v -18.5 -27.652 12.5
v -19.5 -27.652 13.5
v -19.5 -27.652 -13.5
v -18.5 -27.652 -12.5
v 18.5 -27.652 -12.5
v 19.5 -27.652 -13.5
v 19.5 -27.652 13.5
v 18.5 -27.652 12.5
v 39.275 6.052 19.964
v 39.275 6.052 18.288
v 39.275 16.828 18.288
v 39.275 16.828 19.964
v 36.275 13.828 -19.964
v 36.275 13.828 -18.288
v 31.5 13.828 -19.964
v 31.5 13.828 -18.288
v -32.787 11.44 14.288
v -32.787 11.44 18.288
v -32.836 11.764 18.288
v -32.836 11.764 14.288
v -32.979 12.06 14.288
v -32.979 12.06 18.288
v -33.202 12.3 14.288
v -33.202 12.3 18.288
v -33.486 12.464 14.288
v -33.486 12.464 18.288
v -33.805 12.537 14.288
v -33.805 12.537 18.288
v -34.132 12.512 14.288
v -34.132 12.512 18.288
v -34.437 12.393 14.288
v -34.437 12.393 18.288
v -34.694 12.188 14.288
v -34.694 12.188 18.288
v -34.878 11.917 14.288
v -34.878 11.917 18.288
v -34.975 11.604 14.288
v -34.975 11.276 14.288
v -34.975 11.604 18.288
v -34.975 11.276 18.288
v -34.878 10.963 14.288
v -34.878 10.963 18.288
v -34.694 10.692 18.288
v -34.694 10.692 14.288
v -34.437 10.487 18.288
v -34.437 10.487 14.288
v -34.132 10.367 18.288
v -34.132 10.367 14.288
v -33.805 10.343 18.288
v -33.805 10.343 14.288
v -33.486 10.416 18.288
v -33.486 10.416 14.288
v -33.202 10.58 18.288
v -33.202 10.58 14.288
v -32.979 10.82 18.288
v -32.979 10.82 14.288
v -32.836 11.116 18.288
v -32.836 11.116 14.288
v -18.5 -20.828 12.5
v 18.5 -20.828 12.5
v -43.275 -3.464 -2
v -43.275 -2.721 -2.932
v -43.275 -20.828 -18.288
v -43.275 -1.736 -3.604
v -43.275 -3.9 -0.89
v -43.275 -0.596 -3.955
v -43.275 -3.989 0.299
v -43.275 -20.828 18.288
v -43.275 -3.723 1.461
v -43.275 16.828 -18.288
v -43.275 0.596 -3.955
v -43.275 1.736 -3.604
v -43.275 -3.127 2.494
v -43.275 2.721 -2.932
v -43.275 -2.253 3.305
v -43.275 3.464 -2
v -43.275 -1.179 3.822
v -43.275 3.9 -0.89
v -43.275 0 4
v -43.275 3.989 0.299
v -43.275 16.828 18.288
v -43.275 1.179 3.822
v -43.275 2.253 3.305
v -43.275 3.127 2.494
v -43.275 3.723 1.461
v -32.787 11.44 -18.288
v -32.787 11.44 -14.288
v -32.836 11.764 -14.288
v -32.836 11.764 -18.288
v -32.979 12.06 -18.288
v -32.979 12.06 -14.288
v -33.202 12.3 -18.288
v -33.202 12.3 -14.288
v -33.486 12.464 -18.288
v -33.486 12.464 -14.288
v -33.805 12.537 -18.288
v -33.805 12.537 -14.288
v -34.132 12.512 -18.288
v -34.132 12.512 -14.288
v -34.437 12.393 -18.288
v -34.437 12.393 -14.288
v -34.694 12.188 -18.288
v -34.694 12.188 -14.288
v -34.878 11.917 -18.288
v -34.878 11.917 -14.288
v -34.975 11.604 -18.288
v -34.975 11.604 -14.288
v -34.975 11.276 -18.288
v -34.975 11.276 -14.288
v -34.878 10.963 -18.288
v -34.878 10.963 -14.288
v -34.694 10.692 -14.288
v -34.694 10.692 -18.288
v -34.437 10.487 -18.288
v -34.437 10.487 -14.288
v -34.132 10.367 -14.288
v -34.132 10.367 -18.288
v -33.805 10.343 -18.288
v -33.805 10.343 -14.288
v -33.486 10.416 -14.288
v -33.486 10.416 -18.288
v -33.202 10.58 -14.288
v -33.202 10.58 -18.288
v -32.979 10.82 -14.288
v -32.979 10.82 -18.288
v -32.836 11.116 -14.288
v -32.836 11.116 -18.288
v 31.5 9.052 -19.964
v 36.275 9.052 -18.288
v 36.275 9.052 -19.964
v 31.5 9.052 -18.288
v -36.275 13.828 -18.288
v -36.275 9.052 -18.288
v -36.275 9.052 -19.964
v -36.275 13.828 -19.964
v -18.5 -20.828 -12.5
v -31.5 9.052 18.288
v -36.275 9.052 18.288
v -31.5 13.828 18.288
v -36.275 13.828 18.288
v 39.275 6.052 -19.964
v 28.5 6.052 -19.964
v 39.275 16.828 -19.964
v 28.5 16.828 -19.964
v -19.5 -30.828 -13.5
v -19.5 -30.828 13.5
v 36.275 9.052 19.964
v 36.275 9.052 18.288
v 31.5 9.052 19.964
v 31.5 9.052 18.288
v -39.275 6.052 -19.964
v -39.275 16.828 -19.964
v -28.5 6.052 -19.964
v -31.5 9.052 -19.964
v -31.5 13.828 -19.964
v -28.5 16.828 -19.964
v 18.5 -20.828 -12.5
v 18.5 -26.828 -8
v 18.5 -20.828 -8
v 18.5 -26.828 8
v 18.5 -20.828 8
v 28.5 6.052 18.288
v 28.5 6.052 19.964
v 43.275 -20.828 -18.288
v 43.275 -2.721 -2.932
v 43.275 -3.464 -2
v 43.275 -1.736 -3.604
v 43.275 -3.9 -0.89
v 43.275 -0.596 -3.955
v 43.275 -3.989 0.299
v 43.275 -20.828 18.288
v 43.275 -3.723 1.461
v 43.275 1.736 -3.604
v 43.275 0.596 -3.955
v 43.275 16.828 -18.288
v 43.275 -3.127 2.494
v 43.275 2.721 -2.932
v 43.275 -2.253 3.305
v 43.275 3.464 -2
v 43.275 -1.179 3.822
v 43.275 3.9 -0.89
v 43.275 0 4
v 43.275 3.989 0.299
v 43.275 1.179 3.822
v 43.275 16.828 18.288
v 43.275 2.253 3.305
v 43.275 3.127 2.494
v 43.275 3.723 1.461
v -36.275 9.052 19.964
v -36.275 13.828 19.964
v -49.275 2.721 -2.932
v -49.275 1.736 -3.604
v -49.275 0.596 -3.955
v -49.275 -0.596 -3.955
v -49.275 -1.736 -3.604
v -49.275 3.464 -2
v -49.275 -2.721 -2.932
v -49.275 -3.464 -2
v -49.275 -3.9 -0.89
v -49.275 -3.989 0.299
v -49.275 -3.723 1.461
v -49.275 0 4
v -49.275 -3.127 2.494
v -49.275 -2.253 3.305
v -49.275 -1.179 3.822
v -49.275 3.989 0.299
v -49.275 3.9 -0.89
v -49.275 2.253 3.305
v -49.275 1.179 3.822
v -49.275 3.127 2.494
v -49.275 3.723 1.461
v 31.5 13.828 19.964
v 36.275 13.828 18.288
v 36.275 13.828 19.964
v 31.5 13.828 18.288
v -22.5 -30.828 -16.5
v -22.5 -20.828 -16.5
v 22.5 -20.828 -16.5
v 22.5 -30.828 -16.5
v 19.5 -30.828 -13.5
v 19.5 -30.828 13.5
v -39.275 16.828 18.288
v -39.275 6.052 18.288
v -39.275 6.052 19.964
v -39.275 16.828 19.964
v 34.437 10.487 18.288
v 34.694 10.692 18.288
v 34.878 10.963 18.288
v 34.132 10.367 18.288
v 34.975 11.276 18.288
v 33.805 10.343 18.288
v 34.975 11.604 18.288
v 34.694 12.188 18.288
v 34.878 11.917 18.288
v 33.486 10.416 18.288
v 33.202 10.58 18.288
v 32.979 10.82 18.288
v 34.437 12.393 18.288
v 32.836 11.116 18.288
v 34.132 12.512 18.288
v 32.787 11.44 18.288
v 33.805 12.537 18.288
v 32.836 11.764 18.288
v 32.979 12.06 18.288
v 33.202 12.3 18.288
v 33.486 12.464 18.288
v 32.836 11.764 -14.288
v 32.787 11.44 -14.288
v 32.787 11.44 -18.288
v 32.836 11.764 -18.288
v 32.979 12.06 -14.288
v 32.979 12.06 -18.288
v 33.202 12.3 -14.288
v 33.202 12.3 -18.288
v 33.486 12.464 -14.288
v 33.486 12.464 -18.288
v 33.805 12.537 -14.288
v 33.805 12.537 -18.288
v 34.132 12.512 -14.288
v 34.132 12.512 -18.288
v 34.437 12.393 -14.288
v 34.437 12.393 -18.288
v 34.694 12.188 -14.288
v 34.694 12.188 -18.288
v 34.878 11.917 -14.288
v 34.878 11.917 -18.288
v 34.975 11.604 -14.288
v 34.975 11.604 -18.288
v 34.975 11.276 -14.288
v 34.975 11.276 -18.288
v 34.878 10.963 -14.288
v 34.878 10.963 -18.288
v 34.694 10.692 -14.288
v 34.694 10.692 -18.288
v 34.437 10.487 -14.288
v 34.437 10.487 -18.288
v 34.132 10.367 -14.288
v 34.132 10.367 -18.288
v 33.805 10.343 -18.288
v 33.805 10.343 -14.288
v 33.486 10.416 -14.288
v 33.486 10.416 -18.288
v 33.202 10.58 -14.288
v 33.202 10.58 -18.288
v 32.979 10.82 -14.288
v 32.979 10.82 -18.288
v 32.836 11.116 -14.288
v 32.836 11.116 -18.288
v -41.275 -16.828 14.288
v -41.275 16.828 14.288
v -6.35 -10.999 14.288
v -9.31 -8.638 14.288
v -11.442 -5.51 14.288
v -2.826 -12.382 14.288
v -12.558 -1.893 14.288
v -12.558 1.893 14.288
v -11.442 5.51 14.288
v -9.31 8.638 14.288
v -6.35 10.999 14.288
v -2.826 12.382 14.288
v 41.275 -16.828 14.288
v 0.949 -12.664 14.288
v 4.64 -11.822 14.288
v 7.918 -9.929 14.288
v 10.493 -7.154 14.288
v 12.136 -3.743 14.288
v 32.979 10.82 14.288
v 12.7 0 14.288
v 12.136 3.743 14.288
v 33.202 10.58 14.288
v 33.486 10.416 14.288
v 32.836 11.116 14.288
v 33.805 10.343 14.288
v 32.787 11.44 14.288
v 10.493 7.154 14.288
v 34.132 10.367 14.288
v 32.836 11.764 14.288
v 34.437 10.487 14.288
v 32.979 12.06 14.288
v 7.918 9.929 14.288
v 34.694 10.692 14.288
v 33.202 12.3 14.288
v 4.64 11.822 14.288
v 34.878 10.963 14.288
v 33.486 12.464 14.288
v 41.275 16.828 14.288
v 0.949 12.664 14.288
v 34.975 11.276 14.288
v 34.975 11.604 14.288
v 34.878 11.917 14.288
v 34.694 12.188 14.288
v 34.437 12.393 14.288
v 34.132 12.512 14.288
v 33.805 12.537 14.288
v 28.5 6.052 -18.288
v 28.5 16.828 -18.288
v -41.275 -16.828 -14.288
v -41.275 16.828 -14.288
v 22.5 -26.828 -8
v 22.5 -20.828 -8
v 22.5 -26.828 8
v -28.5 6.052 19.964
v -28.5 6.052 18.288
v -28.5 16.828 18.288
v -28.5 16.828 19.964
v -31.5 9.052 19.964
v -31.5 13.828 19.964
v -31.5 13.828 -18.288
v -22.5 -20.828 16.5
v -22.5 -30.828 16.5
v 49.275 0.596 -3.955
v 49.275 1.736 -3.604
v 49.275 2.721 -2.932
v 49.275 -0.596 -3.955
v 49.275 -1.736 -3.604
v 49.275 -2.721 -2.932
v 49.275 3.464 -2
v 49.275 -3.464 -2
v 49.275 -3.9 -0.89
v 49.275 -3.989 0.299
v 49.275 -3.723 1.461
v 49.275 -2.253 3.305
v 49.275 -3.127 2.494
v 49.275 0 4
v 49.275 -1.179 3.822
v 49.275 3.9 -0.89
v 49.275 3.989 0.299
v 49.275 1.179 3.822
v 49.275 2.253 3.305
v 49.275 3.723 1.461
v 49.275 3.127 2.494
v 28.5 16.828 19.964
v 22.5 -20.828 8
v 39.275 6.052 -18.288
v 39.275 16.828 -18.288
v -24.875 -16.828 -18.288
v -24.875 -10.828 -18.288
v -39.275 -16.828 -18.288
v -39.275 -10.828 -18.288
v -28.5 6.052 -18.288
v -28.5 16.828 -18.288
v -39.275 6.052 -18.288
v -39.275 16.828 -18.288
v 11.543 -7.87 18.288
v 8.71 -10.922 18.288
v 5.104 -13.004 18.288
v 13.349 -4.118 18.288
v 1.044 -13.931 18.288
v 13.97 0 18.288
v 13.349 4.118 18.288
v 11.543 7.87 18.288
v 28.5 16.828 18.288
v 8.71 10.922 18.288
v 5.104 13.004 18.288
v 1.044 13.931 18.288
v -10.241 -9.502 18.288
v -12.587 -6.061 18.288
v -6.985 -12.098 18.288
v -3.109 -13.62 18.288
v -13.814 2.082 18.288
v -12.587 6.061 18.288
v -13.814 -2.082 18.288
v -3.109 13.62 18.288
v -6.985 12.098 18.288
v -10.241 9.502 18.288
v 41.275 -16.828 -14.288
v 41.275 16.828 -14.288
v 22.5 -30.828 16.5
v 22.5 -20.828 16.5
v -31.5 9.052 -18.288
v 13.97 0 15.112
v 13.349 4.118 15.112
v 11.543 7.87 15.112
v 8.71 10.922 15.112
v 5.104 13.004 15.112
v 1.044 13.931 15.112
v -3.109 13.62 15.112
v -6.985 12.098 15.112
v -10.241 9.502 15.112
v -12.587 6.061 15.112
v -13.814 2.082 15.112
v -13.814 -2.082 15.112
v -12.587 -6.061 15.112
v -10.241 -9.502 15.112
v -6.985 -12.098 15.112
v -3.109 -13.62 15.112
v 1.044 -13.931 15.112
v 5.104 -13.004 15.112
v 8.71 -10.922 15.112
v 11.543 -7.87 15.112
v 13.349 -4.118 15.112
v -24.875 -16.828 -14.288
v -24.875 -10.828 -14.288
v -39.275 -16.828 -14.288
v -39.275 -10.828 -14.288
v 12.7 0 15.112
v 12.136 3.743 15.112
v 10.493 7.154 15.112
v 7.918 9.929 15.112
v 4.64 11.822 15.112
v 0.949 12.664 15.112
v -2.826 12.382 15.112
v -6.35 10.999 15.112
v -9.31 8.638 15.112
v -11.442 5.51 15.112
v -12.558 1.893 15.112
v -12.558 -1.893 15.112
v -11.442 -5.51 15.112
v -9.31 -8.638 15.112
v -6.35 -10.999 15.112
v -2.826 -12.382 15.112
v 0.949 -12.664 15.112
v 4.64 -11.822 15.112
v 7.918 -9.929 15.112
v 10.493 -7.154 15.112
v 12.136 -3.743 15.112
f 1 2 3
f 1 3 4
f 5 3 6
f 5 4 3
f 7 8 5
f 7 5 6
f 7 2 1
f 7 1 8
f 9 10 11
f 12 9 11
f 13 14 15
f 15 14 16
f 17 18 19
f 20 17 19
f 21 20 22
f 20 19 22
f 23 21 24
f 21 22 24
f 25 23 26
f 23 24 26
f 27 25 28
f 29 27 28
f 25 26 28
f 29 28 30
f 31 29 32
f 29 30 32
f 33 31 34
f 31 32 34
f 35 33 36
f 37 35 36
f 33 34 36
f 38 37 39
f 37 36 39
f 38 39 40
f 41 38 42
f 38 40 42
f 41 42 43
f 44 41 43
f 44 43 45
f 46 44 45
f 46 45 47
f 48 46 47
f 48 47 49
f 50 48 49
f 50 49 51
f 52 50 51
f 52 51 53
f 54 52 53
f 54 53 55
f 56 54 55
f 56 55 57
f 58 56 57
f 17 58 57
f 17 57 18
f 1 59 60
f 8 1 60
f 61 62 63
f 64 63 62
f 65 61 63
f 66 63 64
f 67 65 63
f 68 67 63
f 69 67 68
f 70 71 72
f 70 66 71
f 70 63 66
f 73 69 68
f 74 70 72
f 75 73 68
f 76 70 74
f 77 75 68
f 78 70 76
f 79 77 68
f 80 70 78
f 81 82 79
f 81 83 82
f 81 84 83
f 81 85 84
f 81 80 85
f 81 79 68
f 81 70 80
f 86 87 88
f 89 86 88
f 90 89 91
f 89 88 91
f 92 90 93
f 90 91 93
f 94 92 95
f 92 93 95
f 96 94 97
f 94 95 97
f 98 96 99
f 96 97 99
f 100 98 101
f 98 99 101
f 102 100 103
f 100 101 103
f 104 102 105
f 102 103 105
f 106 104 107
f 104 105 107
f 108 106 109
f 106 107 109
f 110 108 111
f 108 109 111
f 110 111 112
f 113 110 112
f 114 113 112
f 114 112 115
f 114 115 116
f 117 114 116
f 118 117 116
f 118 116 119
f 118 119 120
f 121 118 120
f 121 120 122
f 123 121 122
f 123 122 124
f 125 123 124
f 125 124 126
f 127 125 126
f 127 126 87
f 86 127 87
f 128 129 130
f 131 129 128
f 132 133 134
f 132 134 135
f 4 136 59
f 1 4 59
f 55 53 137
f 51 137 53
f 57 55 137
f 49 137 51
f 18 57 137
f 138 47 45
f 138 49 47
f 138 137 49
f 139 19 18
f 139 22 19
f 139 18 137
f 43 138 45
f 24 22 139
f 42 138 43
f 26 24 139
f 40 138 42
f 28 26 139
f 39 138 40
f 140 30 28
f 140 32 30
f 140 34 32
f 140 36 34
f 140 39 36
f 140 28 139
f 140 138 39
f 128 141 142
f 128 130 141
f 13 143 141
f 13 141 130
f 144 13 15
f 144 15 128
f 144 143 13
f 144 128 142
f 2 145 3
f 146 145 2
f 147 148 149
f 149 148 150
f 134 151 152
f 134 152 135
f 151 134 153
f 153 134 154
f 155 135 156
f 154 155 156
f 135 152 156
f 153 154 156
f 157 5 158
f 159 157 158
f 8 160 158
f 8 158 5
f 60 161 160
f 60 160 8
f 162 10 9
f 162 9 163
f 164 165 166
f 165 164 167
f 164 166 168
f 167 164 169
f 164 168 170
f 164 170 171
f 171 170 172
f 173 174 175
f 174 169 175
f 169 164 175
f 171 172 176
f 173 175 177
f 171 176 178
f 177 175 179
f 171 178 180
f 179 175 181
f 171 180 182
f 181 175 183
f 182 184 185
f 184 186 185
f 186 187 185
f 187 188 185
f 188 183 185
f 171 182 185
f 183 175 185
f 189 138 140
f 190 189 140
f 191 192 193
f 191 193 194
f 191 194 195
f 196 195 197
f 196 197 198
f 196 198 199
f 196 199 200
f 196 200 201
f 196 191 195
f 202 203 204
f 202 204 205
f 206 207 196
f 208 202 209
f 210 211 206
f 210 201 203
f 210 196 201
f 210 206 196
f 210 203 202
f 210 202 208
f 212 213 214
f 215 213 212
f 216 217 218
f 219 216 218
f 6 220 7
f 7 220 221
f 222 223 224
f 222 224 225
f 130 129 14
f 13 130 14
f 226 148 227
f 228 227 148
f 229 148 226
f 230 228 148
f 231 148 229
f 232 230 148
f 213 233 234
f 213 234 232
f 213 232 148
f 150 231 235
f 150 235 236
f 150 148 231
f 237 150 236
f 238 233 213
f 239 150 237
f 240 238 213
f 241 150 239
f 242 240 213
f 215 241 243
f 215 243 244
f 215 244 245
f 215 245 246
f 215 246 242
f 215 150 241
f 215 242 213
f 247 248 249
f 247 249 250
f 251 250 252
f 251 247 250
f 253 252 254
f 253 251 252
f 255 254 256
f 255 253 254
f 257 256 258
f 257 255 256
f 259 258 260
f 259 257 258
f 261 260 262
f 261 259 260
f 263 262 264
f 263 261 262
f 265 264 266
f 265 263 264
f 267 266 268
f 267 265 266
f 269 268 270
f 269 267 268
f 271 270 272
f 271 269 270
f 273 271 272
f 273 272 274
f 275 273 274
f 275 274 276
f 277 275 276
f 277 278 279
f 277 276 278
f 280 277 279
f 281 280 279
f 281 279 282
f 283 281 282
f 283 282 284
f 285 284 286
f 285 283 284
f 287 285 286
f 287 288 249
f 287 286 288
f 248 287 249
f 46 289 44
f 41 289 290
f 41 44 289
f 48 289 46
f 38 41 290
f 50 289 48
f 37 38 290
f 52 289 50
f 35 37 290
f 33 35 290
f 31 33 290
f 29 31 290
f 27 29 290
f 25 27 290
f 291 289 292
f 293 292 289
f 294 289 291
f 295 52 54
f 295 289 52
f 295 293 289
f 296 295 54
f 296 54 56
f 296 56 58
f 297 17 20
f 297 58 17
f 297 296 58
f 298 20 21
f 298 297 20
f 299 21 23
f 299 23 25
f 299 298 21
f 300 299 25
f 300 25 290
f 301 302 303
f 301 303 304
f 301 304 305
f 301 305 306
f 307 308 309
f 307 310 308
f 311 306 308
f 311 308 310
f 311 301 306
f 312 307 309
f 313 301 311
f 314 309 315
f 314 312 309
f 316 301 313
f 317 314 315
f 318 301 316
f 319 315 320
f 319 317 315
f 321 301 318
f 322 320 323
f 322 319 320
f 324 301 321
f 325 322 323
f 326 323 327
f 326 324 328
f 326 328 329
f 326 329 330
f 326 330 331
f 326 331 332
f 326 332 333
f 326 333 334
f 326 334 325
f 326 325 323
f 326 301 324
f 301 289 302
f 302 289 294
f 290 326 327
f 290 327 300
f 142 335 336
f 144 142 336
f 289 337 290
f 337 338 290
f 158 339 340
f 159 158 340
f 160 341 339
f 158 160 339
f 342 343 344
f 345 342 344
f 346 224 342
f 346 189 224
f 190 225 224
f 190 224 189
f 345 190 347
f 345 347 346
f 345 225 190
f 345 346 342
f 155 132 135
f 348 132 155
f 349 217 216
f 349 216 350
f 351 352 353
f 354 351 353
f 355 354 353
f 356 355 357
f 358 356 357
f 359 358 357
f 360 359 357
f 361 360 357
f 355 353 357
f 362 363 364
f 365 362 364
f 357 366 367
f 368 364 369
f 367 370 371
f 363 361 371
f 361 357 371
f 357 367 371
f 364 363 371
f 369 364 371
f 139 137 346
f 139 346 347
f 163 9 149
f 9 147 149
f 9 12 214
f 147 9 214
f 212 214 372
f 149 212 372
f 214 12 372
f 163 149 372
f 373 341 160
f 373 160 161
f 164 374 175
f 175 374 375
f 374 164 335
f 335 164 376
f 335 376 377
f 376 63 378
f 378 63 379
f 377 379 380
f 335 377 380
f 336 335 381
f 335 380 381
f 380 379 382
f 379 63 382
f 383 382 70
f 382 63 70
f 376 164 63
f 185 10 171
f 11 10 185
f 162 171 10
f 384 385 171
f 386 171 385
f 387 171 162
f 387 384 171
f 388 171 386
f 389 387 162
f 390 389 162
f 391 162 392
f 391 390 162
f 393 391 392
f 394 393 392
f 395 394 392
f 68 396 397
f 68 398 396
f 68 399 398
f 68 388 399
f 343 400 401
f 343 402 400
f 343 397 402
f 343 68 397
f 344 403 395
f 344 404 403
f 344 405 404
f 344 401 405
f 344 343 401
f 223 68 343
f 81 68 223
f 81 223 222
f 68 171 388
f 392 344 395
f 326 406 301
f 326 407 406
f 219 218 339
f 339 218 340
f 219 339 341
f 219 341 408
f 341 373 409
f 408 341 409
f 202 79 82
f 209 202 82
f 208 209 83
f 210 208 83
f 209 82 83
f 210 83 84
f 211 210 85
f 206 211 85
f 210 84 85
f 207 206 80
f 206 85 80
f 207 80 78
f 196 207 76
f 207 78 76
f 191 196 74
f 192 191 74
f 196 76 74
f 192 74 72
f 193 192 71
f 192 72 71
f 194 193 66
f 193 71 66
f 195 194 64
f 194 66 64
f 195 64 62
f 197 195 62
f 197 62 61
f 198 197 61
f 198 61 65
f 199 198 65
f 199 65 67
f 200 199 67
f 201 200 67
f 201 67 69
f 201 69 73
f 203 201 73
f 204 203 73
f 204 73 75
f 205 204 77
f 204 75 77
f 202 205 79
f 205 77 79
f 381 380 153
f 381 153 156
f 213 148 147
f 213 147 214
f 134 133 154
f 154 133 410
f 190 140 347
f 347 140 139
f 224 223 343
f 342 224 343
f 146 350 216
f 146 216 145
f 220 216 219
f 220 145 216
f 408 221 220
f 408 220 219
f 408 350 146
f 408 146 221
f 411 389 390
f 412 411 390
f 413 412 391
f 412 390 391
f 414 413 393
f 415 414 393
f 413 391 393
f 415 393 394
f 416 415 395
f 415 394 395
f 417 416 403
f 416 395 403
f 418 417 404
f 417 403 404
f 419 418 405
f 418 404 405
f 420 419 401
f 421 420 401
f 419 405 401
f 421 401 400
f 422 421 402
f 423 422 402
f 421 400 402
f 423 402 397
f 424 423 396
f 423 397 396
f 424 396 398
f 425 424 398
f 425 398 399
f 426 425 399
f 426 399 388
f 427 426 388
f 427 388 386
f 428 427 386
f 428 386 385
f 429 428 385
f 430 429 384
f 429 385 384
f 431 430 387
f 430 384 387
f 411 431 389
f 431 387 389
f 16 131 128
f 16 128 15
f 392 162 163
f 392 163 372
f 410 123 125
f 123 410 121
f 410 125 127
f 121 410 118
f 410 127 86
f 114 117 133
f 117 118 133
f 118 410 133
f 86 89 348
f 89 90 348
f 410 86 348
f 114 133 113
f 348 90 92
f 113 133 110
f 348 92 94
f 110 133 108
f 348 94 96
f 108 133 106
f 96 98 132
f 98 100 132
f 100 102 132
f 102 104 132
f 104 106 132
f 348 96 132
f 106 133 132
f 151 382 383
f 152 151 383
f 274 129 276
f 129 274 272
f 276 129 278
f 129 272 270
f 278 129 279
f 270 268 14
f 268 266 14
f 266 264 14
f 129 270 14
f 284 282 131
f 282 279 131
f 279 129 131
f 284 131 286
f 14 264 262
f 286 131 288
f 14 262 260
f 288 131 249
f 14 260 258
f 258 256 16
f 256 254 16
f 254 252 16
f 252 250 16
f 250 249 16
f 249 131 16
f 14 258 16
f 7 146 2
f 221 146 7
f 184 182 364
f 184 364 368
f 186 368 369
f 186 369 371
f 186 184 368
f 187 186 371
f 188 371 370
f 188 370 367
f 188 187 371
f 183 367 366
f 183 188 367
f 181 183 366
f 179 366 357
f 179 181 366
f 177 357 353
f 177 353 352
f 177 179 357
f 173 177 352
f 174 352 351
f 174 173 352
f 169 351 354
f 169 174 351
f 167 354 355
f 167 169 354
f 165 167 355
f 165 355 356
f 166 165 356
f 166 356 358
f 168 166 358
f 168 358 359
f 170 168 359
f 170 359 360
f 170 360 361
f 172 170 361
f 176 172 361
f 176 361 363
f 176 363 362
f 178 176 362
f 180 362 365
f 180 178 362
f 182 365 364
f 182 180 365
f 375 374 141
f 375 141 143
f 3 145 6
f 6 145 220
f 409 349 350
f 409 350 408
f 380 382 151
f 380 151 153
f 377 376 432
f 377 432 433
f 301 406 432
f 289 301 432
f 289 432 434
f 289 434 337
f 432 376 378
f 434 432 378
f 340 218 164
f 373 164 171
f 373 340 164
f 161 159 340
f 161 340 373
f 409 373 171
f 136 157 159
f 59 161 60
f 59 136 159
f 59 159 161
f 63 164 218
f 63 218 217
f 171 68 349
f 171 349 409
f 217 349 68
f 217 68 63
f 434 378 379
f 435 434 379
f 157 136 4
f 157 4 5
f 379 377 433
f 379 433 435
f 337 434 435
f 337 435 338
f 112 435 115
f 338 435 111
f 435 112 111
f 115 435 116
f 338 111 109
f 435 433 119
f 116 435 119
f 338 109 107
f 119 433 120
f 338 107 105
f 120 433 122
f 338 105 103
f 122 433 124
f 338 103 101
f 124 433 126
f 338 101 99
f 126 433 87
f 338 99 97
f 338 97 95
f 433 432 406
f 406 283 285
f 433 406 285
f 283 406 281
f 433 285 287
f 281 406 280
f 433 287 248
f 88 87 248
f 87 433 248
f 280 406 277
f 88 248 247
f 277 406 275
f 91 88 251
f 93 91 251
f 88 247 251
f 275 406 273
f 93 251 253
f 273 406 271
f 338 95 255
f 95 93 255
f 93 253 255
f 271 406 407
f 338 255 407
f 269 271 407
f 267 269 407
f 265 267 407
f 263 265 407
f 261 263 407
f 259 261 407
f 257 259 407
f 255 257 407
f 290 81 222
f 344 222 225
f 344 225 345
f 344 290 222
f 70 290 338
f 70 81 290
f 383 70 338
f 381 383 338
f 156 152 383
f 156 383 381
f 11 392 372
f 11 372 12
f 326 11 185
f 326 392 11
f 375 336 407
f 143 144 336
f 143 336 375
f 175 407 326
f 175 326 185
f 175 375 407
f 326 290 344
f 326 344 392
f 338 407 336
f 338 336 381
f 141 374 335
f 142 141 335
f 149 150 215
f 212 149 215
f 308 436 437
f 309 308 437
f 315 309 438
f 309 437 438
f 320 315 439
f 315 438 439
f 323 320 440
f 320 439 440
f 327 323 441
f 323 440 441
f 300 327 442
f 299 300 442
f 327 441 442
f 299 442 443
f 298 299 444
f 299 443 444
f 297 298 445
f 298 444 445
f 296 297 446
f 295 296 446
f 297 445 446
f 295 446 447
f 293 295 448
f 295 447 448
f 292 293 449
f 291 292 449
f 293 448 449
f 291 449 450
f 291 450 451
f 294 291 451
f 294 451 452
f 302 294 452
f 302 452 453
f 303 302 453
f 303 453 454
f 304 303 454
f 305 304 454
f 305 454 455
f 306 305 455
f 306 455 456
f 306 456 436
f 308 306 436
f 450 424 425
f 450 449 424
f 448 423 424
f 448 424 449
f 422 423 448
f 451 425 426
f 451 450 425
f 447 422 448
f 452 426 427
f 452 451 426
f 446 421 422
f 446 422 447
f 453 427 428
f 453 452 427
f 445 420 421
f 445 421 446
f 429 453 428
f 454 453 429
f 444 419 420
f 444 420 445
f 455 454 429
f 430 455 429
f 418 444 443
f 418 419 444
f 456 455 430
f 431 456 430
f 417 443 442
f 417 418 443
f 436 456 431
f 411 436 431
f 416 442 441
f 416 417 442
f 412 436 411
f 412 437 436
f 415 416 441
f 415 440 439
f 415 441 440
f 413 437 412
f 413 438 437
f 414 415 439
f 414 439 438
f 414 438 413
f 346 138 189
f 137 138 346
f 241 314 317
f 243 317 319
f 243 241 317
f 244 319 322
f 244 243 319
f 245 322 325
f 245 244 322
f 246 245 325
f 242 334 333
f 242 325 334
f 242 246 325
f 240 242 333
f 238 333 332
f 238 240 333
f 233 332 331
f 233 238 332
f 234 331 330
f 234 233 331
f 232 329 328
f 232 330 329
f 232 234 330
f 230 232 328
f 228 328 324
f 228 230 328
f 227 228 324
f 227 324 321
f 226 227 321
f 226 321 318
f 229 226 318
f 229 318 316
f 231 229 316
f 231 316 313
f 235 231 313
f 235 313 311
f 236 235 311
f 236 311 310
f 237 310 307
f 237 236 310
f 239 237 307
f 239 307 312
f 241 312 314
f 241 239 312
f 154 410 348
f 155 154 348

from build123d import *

# Parameters (mm, degrees)
SKETCH1_W                 = 36.575
SKETCH1_H                 = 41.655
SKETCH1_W_2               = 28.575
SKETCH1_H_2               = 33.655
BOSS_EXTRUDE1_DEPTH       = 41.275
SKETCH2_W                 = 36.575
SKETCH2_H                 = 41.655
BOSS_EXTRUDE2_DEPTH       = 2
SKETCH3_W                 = 86.55
SKETCH3_H                 = 36.575
CUT_EXTRUDE1_DEPTH        = 4
SKETCH4_W                 = 10.7752
SKETCH4_H                 = 10.7752
SKETCH4_W_2               = 4.7752
SKETCH4_H_2               = 4.7752
BOSS_EXTRUDE3_DEPTH       = 1.6764
MIRROR3_COPY_1_SKETCH_W   = 10.7752
MIRROR3_COPY_1_SKETCH_H   = 10.7752
MIRROR3_COPY_1_SKETCH_W_2 = 4.7752
MIRROR3_COPY_1_SKETCH_H_2 = 4.7752
MIRROR3_COPY_1_DEPTH      = 1.6764
SKETCH5_R                 = 1.1
CUT_EXTRUDE2_DEPTH        = 62.397719691
SKETCH6_R                 = 4
BOSS_EXTRUDE4_DEPTH       = 6
SKETCH7_R                 = 12.7
CUT_EXTRUDE3_DEPTH        = 4
SKETCH8_R                 = 13.97
CUT_EXTRUDE4_DEPTH        = 3.175
SKETCH9_W                 = 14.4
SKETCH9_H                 = 6
CUT_EXTRUDE5_DEPTH        = 4
SKETCH10_W                = 45
SKETCH10_H                = 33
SKETCH10_W_2              = 37
SKETCH10_H_2              = 25
BOSS_EXTRUDE5_DEPTH       = 10
SKETCH11_W                = 39
SKETCH11_H                = 27
CUT_EXTRUDE7_DEPTH        = 3.175
SKETCH14_W                = 16
SKETCH14_H                = 6
CUT_EXTRUDE8_DEPTH        = 4


with BuildPart() as part:
    # Sketch1 → Boss-Extrude1 (new, symmetric)
    with BuildSketch(Plane(origin=(0, 0, 0), x_dir=(0, 0, -1), z_dir=(1, 0, 0))):
        Rectangle(SKETCH1_W, SKETCH1_H)
        Rectangle(SKETCH1_W_2, SKETCH1_H_2, mode=Mode.SUBTRACT)
    extrude(amount=BOSS_EXTRUDE1_DEPTH, both=True)

    # Sketch2 → Boss-Extrude2 (add)
    with BuildSketch(Plane.ZY.offset(41.275)):
        Rectangle(SKETCH2_W, SKETCH2_H)
    boss_extrude2 = extrude(amount=BOSS_EXTRUDE2_DEPTH)

    # Mirror1: Boss-Extrude2 across plane
    add(boss_extrude2.mirror(Plane(origin=(0, 0, 0), x_dir=(0, 0, 1), z_dir=(1, 0, 0))))

    # Sketch3 → Cut-Extrude1 (cut)
    with BuildSketch(Plane(origin=(0, 20.8275, 0), x_dir=(1, 0, 0), z_dir=(0, 1, 0))):
        Rectangle(SKETCH3_W, SKETCH3_H)
    extrude(amount=-CUT_EXTRUDE1_DEPTH, mode=Mode.SUBTRACT)

    # Sketch4 → Boss-Extrude3 (add)
    with BuildSketch(Plane(origin=(0, 0, -18.2875), x_dir=(-1, 0, 0), z_dir=(0, 0, -1))):
        with Locations((-33.8874, 11.4399)):
            Rectangle(SKETCH4_W, SKETCH4_H)
        with Locations((-33.8874, 11.4399)):
            Rectangle(SKETCH4_W_2, SKETCH4_H_2, mode=Mode.SUBTRACT)
    boss_extrude3 = extrude(amount=BOSS_EXTRUDE3_DEPTH)

    # Mirror2: Boss-Extrude3 across plane
    add(boss_extrude3.mirror(Plane(origin=(0, 0, 0), x_dir=(0, 0, 1), z_dir=(1, 0, 0))))

    # Mirror3: Boss-Extrude3 across plane
    add(boss_extrude3.mirror(Plane.XY))

    # Mirror3 copy 1 sketch → Mirror3 copy 1 (add)
    with BuildSketch(Plane.XY.offset(18.2875)):
        with Locations((-33.8874, 11.4399)):
            Rectangle(MIRROR3_COPY_1_SKETCH_W, MIRROR3_COPY_1_SKETCH_H)
        with Locations((-33.8874, 11.4399)):
            Rectangle(MIRROR3_COPY_1_SKETCH_W_2, MIRROR3_COPY_1_SKETCH_H_2, mode=Mode.SUBTRACT)
    extrude(amount=MIRROR3_COPY_1_DEPTH)

    # Sketch5 → Cut-Extrude2 (cut, through all)
    with BuildSketch(Plane.XY.offset(18.2875)):
        with Locations((-33.8874, 11.4399)):
            Circle(SKETCH5_R)
    cut_extrude2 = extrude(amount=-CUT_EXTRUDE2_DEPTH, mode=Mode.SUBTRACT)

    # Mirror4: Cut-Extrude2 across plane
    add(cut_extrude2.mirror(Plane(origin=(0, 0, 0), x_dir=(0, 0, 1), z_dir=(1, 0, 0))), mode=Mode.SUBTRACT)

    # Sketch6 → Boss-Extrude4 (add)
    with BuildSketch(Plane.ZY.offset(43.275)):
        Circle(SKETCH6_R)
    boss_extrude4 = extrude(amount=BOSS_EXTRUDE4_DEPTH)

    # Mirror5: Boss-Extrude4 across plane
    add(boss_extrude4.mirror(Plane(origin=(0, 0, 0), x_dir=(0, 0, 1), z_dir=(1, 0, 0))))

    # Sketch7 → Cut-Extrude3 (cut)
    with BuildSketch(Plane.XY.offset(18.2875)):
        Circle(SKETCH7_R)
    extrude(amount=-CUT_EXTRUDE3_DEPTH, mode=Mode.SUBTRACT)

    # Sketch8 → Cut-Extrude4 (cut)
    with BuildSketch(Plane.XY.offset(18.2875)):
        Circle(SKETCH8_R)
    extrude(amount=-CUT_EXTRUDE4_DEPTH, mode=Mode.SUBTRACT)

    # Sketch9 → Cut-Extrude5 (cut)
    with BuildSketch(Plane(origin=(0, 0, -18.2875), x_dir=(-1, 0, 0), z_dir=(0, 0, -1))):
        with Locations((32.075, -13.8275)):
            Rectangle(SKETCH9_W, SKETCH9_H)
    extrude(amount=-CUT_EXTRUDE5_DEPTH, mode=Mode.SUBTRACT)

    # Sketch10 → Boss-Extrude5 (add)
    with BuildSketch(Plane.XZ.offset(20.8275)):
        Rectangle(SKETCH10_W, SKETCH10_H)
        Rectangle(SKETCH10_W_2, SKETCH10_H_2, mode=Mode.SUBTRACT)
    extrude(amount=BOSS_EXTRUDE5_DEPTH)

    # Sketch11 → Cut-Extrude7 (cut)
    with BuildSketch(Plane.XZ.offset(30.8275)):
        Rectangle(SKETCH11_W, SKETCH11_H)
    extrude(amount=-CUT_EXTRUDE7_DEPTH, mode=Mode.SUBTRACT)

    # Sketch14 → Cut-Extrude8 (cut)
    with BuildSketch(Plane(origin=(22.5, 0, 0), x_dir=(0, 0, -1), z_dir=(1, 0, 0))):
        with Locations((0, -23.8275)):
            Rectangle(SKETCH14_W, SKETCH14_H)
    extrude(amount=-CUT_EXTRUDE8_DEPTH, mode=Mode.SUBTRACT)


solid = part.part
